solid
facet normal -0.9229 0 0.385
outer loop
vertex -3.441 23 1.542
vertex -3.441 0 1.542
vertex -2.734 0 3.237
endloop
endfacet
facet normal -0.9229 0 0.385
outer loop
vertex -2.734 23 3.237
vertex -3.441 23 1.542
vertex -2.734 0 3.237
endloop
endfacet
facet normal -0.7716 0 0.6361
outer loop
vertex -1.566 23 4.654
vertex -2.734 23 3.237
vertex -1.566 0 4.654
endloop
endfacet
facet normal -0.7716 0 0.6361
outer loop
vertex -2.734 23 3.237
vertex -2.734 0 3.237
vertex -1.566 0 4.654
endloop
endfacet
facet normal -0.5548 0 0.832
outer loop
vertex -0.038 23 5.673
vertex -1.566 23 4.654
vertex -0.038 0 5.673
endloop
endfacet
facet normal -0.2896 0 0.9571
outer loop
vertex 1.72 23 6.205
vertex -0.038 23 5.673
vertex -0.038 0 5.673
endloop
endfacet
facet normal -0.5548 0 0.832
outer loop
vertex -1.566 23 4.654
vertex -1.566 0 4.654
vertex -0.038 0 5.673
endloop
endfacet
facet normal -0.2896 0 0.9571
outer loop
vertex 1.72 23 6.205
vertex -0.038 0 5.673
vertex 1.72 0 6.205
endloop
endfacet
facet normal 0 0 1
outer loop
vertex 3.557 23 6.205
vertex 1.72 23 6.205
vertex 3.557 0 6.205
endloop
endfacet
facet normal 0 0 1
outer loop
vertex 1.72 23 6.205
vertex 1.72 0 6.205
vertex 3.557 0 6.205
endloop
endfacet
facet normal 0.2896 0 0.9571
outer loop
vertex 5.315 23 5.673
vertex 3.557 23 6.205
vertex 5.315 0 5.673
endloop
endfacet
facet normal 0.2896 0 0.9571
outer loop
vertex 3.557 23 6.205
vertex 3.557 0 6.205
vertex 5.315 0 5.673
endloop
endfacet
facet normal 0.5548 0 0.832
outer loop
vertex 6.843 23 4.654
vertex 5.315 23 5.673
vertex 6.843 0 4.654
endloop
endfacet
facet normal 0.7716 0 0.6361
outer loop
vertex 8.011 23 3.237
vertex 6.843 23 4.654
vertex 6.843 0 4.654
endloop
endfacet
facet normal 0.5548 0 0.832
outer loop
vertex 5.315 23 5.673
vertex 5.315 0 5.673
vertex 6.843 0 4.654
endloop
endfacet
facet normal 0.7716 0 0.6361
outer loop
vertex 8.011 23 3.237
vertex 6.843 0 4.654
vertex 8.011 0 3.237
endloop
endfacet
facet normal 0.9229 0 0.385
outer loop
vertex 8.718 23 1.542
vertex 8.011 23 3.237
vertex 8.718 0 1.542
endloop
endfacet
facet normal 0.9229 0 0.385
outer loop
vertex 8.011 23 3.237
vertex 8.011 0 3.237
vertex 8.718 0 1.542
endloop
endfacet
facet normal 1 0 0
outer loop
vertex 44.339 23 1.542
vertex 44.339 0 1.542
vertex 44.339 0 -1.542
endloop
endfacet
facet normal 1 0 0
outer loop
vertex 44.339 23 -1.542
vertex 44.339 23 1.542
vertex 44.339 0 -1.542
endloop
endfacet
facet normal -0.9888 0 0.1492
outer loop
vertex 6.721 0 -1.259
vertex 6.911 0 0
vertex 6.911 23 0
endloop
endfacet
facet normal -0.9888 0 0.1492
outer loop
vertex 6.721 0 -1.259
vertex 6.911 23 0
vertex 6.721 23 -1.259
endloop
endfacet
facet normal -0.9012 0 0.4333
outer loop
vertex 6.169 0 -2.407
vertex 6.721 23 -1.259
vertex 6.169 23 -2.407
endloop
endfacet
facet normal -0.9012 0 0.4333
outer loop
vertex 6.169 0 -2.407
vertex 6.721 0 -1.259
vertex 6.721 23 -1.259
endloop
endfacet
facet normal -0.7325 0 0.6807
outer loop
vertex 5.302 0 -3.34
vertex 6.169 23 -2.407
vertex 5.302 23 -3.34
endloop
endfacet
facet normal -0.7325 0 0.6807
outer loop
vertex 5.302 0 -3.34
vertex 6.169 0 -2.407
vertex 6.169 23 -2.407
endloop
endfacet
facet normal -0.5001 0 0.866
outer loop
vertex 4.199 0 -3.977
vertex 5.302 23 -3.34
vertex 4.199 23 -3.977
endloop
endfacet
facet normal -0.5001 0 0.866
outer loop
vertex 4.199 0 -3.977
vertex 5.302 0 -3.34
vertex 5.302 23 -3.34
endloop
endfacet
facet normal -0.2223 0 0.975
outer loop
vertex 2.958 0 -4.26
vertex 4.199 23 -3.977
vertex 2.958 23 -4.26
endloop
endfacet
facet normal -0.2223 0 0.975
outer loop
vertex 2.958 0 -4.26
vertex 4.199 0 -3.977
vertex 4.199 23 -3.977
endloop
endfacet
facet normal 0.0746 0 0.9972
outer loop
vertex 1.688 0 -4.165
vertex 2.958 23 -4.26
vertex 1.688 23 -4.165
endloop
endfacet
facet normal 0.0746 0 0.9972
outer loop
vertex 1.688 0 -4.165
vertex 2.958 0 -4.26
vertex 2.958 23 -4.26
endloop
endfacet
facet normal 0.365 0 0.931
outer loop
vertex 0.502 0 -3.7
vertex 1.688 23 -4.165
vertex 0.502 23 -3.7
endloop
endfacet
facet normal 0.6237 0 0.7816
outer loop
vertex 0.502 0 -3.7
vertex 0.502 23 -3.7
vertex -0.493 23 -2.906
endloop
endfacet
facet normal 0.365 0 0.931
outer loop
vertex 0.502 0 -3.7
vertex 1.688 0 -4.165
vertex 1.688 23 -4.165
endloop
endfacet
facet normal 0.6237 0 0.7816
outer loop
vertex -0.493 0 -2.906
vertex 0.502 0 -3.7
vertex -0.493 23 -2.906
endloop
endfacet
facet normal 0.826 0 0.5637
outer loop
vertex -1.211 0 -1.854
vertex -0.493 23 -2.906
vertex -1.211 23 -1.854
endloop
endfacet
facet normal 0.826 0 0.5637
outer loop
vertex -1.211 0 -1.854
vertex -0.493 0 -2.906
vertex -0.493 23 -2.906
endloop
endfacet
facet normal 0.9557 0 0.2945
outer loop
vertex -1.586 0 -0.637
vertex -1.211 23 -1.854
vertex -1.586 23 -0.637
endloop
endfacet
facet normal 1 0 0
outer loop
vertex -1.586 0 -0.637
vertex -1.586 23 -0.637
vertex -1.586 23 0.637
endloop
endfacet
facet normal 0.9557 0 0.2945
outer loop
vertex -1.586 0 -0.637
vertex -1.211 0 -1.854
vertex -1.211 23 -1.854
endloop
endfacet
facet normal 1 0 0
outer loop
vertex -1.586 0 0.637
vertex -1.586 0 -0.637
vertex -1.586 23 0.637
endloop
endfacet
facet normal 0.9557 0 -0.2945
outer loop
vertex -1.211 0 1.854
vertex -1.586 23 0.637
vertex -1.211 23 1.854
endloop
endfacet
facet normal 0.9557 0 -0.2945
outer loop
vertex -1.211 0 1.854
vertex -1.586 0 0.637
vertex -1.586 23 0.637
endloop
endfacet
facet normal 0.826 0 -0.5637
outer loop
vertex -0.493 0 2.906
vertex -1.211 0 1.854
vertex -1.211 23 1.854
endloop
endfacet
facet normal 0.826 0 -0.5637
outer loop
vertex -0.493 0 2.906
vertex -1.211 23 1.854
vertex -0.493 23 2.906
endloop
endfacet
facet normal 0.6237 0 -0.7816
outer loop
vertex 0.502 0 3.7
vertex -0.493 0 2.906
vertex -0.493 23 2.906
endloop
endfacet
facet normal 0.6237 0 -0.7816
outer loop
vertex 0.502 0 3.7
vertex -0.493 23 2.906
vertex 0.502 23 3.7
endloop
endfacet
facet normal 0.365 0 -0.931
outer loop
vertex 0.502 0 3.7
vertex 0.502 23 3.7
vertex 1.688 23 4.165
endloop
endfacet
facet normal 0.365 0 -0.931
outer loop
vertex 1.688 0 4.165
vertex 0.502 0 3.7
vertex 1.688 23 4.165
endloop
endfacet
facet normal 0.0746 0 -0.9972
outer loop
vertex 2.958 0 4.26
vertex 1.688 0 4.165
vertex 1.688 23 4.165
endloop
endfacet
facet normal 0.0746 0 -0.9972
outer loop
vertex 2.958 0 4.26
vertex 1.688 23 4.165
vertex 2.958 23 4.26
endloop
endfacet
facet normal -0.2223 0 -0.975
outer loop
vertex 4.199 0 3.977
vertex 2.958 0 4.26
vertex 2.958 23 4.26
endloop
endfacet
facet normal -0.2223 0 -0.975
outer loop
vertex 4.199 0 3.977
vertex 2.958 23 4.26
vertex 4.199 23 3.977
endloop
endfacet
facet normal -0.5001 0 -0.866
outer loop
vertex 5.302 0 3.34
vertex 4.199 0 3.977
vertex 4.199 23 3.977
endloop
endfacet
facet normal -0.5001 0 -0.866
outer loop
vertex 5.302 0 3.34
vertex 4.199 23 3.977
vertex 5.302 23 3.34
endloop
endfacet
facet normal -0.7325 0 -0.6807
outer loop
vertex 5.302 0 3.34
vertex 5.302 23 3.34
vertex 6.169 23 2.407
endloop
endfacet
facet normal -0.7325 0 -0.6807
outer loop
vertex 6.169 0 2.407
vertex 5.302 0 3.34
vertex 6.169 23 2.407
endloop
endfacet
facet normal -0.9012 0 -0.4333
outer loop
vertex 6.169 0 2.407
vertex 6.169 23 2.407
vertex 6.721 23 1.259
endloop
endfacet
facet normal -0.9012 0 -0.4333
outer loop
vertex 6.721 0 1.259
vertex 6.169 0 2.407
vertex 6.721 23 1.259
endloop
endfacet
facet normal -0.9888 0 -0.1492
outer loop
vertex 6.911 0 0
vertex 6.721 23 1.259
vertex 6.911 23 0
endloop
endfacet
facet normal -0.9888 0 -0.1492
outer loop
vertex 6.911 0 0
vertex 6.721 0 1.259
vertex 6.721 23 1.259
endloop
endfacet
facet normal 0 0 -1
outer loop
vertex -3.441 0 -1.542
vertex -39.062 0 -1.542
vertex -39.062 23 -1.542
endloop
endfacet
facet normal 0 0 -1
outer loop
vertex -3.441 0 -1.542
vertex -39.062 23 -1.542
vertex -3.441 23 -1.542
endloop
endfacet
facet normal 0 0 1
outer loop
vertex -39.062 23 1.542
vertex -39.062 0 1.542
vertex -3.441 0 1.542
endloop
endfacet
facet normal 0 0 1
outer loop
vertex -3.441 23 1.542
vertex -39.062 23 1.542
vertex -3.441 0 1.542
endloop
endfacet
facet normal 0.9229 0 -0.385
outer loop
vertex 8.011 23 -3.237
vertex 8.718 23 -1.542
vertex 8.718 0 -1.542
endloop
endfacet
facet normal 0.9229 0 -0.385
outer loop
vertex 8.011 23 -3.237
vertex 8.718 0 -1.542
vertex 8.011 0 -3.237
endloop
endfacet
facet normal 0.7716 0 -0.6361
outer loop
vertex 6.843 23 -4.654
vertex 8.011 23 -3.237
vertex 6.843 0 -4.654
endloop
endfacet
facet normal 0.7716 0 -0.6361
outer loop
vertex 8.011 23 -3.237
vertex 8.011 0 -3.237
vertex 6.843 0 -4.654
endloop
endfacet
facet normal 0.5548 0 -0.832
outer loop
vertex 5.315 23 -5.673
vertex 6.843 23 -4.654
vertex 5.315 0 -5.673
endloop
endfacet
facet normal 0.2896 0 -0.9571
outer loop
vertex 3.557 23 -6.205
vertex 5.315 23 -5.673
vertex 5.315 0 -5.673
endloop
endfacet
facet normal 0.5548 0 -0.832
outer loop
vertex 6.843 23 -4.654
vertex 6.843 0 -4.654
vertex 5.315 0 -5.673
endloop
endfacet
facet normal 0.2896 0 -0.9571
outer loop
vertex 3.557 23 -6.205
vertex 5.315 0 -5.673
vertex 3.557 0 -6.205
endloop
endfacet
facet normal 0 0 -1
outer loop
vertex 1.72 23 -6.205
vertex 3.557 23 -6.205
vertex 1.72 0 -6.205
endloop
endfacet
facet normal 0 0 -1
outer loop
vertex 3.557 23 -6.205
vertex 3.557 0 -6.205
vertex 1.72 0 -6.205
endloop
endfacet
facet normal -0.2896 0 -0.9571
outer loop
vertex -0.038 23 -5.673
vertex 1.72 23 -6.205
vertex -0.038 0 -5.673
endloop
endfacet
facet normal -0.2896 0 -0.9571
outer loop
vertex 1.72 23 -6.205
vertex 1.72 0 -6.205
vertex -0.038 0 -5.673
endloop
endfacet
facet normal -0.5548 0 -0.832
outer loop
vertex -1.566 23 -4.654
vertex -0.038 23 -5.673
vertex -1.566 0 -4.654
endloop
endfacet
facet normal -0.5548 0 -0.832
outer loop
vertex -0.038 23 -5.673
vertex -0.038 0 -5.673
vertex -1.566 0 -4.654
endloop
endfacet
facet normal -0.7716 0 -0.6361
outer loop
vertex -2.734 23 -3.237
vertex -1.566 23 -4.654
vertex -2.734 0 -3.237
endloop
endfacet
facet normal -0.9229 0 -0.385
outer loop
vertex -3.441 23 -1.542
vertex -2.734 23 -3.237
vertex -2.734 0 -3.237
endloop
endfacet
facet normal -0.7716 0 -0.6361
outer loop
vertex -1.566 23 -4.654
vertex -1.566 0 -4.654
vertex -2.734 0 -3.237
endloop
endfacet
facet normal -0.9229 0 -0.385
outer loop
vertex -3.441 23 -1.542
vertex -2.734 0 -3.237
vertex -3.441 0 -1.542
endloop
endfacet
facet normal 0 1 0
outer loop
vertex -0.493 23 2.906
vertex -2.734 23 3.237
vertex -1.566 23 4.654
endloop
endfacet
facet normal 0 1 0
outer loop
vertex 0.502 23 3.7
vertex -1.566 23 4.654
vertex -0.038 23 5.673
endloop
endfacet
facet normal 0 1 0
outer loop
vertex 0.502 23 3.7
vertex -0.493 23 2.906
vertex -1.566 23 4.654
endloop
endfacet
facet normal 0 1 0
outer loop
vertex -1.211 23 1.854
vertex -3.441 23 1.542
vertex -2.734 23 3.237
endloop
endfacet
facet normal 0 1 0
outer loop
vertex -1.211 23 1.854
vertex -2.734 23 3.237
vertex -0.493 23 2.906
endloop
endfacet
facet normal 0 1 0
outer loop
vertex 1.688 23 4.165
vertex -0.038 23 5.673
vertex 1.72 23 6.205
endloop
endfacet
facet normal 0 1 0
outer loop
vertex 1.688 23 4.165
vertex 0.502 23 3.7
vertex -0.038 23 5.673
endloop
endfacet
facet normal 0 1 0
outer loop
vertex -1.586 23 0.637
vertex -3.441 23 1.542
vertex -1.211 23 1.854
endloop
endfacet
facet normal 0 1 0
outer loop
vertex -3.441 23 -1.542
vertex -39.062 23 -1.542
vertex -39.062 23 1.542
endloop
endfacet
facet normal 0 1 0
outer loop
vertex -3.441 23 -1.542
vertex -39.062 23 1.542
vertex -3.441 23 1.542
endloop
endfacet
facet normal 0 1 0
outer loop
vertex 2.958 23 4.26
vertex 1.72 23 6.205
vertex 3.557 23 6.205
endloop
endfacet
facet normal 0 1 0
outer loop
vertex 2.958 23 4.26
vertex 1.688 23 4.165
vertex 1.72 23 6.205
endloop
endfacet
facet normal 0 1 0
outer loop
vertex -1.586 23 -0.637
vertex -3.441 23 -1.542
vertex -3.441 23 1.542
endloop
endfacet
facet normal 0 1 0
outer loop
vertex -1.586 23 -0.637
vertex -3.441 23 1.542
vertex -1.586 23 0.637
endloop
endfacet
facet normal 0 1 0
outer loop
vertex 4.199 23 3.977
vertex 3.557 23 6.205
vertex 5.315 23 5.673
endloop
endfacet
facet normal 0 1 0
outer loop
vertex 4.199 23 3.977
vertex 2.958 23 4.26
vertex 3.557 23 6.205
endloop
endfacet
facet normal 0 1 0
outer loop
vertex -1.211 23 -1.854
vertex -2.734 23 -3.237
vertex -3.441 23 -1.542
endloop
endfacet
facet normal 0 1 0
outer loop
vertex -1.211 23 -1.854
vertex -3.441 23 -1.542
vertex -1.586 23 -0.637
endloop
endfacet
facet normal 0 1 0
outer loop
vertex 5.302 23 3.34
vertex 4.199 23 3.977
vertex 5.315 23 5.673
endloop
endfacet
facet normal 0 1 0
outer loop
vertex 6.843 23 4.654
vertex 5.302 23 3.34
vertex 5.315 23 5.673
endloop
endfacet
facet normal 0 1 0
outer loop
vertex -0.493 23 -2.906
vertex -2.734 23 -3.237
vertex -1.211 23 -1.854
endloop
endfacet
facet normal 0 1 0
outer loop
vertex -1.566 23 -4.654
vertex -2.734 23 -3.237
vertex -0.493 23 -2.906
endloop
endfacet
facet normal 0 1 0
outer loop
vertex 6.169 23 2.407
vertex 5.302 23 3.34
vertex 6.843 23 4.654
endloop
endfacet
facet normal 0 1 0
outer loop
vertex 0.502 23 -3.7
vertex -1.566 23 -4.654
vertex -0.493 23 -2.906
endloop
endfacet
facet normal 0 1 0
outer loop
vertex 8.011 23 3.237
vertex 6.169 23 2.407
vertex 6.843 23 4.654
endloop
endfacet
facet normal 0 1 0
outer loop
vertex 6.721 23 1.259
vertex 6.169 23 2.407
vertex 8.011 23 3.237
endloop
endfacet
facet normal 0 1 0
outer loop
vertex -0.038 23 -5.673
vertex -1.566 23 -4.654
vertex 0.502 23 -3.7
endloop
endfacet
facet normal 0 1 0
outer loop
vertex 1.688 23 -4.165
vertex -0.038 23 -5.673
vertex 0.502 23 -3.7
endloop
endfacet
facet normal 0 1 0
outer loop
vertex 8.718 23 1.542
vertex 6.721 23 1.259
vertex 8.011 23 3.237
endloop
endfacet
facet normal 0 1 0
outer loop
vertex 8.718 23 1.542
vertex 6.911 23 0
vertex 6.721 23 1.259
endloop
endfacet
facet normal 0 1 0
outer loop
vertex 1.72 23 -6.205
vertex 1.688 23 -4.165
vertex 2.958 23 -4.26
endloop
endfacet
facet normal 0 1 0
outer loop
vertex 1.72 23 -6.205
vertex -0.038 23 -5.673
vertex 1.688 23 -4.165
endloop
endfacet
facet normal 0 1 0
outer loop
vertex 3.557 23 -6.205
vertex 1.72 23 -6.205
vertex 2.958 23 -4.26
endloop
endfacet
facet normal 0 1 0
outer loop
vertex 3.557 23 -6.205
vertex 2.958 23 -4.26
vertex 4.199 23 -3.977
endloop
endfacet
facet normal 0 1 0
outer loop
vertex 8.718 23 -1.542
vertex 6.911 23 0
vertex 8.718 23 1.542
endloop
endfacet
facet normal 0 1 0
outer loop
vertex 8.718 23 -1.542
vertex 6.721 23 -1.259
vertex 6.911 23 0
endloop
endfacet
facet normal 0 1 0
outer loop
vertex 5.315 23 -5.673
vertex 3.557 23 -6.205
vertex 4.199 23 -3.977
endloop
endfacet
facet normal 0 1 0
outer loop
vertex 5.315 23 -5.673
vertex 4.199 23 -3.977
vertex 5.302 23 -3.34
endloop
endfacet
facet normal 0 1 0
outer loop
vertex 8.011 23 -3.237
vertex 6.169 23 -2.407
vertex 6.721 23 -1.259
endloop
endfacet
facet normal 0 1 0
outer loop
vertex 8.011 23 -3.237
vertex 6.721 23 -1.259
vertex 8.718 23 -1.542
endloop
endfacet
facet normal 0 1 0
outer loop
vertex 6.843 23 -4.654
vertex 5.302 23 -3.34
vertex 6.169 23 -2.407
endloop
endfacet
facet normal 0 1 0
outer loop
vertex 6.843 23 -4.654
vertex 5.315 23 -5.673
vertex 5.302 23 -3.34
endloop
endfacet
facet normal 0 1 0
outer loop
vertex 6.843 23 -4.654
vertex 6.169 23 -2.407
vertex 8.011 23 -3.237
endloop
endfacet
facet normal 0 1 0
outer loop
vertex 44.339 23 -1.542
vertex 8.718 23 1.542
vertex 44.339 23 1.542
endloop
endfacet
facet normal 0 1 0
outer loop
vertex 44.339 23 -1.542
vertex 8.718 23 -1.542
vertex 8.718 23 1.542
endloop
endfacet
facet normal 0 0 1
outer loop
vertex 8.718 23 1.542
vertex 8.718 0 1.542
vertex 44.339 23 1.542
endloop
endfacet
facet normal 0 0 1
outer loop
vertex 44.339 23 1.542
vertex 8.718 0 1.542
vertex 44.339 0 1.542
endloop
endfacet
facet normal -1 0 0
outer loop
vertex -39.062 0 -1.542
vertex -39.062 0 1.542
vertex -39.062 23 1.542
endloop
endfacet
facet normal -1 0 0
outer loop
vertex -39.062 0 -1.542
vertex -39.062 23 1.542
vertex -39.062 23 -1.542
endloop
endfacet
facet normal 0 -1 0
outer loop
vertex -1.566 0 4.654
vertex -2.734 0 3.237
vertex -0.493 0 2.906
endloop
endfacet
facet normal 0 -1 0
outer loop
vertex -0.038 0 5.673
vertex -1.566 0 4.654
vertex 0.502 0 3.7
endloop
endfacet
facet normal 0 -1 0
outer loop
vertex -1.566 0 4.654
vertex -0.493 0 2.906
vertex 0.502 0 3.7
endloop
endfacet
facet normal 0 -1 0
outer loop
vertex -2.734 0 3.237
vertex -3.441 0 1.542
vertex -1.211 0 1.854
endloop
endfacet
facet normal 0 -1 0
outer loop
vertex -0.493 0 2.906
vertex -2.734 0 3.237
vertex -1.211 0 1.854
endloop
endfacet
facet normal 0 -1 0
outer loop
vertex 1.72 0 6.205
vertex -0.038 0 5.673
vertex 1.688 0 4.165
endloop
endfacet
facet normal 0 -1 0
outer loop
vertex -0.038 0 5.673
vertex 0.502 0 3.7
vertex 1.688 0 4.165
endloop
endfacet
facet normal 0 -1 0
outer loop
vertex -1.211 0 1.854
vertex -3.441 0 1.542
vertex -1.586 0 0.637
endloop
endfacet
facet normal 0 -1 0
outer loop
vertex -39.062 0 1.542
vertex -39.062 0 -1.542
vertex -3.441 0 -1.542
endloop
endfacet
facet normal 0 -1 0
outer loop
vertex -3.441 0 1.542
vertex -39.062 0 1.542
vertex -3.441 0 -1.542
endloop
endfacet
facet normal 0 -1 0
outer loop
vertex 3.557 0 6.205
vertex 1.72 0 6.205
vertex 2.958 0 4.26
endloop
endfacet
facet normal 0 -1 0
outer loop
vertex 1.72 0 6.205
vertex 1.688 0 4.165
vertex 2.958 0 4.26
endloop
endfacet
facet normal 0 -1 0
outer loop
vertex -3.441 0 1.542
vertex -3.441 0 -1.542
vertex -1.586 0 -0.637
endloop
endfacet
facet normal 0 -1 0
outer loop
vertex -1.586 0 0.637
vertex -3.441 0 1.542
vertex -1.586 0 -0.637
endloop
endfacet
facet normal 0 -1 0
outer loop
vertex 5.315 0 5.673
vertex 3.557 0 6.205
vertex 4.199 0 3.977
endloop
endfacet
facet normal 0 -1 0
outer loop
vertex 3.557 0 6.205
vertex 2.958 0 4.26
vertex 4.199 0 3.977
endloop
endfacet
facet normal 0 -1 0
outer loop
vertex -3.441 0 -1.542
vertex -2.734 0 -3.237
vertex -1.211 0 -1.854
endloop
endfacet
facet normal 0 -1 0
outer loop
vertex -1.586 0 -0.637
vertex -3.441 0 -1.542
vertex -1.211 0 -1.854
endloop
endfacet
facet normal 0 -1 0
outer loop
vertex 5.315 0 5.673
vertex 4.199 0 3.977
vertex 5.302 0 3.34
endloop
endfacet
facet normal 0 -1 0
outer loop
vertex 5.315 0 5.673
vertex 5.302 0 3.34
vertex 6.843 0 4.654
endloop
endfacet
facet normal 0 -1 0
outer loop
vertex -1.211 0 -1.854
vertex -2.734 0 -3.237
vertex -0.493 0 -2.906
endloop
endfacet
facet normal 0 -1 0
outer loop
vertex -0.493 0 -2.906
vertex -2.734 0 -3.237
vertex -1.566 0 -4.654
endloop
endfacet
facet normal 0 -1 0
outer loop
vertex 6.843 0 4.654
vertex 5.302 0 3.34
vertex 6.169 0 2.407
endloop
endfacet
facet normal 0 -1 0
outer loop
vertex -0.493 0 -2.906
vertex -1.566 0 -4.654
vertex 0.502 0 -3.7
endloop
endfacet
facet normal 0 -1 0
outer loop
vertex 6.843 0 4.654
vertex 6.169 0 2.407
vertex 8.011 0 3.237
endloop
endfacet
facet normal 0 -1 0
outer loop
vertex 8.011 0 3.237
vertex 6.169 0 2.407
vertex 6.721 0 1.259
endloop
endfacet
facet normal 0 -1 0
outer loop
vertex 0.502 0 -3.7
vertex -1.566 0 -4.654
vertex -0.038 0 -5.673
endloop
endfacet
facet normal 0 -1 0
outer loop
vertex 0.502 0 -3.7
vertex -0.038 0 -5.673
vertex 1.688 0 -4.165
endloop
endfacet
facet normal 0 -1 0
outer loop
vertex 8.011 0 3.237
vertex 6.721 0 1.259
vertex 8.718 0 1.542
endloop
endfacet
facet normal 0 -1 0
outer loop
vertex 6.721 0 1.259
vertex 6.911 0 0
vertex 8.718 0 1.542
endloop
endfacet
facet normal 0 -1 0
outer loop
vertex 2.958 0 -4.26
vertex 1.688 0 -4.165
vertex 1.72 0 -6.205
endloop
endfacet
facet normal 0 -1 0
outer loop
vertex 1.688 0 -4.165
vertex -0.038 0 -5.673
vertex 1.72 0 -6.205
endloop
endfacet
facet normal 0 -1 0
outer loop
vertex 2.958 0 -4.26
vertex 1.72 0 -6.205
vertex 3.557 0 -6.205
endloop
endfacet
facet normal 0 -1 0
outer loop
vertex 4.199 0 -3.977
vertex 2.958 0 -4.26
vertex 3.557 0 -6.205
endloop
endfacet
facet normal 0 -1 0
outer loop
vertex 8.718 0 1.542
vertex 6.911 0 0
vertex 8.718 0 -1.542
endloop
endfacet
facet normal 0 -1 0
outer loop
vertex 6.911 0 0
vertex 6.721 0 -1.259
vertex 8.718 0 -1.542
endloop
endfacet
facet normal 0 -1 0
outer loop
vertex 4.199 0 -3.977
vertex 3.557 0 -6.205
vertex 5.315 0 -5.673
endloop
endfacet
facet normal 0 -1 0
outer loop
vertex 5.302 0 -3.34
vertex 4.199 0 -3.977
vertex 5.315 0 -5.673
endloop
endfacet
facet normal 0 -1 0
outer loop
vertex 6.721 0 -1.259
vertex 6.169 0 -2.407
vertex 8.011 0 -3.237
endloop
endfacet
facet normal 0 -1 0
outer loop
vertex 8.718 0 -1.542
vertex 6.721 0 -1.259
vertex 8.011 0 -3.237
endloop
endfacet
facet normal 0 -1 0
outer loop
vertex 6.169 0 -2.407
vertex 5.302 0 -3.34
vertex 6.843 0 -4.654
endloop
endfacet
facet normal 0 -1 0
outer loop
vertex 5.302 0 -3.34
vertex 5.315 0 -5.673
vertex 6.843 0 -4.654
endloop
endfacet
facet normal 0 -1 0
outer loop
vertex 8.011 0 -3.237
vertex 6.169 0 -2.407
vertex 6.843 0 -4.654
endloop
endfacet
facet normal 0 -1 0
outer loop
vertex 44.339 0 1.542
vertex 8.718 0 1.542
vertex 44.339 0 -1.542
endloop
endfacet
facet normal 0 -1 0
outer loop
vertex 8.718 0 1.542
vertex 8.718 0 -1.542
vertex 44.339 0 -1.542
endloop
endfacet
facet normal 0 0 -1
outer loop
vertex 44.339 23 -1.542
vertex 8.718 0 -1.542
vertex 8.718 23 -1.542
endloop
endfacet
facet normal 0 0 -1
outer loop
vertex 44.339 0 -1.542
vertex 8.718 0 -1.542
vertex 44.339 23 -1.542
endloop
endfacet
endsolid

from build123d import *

# Parameters (mm, degrees)
BOSS_EXTRUDE2_DEPTH      = 23
BOSS_EXTRUDE2_DEPTH_BACK = 0.0001
SKETCH2_R                = 6.272360189
SKETCH2_W                = 83.401872842
SKETCH2_H                = 3.0835427
SHELL3_START             = -0.0001
SHELL3_OUTLINE_R         = 4.272360189
SHELL3_DEPTH             = 23.0001


# Read off the part's stored shape, not the designer's step: Shell3
with BuildPart() as part:
    # Sketch2 → Boss-Extrude2 (new, two sides: drawn at the far end of the back side and taken through both)
    with BuildSketch(Plane(origin=(0, 0, 0), x_dir=(1, 0, 0), z_dir=(0, 1, 0)).offset(-BOSS_EXTRUDE2_DEPTH_BACK)):
        with Locations((2.638515629, 0)):
            Circle(SKETCH2_R)
        with Locations((2.638515629, 0)):
            Rectangle(SKETCH2_W, SKETCH2_H)
    extrude(amount=BOSS_EXTRUDE2_DEPTH + BOSS_EXTRUDE2_DEPTH_BACK)

    # Shell3 outline → Shell3 (cut)
    with BuildSketch(Plane(origin=(0, 0, 0), x_dir=(1, 0, 0), z_dir=(0, 1, 0)).offset(SHELL3_START)):
        with Locations((2.638515629, 0)):
            Circle(SHELL3_OUTLINE_R)
    extrude(amount=SHELL3_DEPTH, mode=Mode.SUBTRACT)


solid = part.part
